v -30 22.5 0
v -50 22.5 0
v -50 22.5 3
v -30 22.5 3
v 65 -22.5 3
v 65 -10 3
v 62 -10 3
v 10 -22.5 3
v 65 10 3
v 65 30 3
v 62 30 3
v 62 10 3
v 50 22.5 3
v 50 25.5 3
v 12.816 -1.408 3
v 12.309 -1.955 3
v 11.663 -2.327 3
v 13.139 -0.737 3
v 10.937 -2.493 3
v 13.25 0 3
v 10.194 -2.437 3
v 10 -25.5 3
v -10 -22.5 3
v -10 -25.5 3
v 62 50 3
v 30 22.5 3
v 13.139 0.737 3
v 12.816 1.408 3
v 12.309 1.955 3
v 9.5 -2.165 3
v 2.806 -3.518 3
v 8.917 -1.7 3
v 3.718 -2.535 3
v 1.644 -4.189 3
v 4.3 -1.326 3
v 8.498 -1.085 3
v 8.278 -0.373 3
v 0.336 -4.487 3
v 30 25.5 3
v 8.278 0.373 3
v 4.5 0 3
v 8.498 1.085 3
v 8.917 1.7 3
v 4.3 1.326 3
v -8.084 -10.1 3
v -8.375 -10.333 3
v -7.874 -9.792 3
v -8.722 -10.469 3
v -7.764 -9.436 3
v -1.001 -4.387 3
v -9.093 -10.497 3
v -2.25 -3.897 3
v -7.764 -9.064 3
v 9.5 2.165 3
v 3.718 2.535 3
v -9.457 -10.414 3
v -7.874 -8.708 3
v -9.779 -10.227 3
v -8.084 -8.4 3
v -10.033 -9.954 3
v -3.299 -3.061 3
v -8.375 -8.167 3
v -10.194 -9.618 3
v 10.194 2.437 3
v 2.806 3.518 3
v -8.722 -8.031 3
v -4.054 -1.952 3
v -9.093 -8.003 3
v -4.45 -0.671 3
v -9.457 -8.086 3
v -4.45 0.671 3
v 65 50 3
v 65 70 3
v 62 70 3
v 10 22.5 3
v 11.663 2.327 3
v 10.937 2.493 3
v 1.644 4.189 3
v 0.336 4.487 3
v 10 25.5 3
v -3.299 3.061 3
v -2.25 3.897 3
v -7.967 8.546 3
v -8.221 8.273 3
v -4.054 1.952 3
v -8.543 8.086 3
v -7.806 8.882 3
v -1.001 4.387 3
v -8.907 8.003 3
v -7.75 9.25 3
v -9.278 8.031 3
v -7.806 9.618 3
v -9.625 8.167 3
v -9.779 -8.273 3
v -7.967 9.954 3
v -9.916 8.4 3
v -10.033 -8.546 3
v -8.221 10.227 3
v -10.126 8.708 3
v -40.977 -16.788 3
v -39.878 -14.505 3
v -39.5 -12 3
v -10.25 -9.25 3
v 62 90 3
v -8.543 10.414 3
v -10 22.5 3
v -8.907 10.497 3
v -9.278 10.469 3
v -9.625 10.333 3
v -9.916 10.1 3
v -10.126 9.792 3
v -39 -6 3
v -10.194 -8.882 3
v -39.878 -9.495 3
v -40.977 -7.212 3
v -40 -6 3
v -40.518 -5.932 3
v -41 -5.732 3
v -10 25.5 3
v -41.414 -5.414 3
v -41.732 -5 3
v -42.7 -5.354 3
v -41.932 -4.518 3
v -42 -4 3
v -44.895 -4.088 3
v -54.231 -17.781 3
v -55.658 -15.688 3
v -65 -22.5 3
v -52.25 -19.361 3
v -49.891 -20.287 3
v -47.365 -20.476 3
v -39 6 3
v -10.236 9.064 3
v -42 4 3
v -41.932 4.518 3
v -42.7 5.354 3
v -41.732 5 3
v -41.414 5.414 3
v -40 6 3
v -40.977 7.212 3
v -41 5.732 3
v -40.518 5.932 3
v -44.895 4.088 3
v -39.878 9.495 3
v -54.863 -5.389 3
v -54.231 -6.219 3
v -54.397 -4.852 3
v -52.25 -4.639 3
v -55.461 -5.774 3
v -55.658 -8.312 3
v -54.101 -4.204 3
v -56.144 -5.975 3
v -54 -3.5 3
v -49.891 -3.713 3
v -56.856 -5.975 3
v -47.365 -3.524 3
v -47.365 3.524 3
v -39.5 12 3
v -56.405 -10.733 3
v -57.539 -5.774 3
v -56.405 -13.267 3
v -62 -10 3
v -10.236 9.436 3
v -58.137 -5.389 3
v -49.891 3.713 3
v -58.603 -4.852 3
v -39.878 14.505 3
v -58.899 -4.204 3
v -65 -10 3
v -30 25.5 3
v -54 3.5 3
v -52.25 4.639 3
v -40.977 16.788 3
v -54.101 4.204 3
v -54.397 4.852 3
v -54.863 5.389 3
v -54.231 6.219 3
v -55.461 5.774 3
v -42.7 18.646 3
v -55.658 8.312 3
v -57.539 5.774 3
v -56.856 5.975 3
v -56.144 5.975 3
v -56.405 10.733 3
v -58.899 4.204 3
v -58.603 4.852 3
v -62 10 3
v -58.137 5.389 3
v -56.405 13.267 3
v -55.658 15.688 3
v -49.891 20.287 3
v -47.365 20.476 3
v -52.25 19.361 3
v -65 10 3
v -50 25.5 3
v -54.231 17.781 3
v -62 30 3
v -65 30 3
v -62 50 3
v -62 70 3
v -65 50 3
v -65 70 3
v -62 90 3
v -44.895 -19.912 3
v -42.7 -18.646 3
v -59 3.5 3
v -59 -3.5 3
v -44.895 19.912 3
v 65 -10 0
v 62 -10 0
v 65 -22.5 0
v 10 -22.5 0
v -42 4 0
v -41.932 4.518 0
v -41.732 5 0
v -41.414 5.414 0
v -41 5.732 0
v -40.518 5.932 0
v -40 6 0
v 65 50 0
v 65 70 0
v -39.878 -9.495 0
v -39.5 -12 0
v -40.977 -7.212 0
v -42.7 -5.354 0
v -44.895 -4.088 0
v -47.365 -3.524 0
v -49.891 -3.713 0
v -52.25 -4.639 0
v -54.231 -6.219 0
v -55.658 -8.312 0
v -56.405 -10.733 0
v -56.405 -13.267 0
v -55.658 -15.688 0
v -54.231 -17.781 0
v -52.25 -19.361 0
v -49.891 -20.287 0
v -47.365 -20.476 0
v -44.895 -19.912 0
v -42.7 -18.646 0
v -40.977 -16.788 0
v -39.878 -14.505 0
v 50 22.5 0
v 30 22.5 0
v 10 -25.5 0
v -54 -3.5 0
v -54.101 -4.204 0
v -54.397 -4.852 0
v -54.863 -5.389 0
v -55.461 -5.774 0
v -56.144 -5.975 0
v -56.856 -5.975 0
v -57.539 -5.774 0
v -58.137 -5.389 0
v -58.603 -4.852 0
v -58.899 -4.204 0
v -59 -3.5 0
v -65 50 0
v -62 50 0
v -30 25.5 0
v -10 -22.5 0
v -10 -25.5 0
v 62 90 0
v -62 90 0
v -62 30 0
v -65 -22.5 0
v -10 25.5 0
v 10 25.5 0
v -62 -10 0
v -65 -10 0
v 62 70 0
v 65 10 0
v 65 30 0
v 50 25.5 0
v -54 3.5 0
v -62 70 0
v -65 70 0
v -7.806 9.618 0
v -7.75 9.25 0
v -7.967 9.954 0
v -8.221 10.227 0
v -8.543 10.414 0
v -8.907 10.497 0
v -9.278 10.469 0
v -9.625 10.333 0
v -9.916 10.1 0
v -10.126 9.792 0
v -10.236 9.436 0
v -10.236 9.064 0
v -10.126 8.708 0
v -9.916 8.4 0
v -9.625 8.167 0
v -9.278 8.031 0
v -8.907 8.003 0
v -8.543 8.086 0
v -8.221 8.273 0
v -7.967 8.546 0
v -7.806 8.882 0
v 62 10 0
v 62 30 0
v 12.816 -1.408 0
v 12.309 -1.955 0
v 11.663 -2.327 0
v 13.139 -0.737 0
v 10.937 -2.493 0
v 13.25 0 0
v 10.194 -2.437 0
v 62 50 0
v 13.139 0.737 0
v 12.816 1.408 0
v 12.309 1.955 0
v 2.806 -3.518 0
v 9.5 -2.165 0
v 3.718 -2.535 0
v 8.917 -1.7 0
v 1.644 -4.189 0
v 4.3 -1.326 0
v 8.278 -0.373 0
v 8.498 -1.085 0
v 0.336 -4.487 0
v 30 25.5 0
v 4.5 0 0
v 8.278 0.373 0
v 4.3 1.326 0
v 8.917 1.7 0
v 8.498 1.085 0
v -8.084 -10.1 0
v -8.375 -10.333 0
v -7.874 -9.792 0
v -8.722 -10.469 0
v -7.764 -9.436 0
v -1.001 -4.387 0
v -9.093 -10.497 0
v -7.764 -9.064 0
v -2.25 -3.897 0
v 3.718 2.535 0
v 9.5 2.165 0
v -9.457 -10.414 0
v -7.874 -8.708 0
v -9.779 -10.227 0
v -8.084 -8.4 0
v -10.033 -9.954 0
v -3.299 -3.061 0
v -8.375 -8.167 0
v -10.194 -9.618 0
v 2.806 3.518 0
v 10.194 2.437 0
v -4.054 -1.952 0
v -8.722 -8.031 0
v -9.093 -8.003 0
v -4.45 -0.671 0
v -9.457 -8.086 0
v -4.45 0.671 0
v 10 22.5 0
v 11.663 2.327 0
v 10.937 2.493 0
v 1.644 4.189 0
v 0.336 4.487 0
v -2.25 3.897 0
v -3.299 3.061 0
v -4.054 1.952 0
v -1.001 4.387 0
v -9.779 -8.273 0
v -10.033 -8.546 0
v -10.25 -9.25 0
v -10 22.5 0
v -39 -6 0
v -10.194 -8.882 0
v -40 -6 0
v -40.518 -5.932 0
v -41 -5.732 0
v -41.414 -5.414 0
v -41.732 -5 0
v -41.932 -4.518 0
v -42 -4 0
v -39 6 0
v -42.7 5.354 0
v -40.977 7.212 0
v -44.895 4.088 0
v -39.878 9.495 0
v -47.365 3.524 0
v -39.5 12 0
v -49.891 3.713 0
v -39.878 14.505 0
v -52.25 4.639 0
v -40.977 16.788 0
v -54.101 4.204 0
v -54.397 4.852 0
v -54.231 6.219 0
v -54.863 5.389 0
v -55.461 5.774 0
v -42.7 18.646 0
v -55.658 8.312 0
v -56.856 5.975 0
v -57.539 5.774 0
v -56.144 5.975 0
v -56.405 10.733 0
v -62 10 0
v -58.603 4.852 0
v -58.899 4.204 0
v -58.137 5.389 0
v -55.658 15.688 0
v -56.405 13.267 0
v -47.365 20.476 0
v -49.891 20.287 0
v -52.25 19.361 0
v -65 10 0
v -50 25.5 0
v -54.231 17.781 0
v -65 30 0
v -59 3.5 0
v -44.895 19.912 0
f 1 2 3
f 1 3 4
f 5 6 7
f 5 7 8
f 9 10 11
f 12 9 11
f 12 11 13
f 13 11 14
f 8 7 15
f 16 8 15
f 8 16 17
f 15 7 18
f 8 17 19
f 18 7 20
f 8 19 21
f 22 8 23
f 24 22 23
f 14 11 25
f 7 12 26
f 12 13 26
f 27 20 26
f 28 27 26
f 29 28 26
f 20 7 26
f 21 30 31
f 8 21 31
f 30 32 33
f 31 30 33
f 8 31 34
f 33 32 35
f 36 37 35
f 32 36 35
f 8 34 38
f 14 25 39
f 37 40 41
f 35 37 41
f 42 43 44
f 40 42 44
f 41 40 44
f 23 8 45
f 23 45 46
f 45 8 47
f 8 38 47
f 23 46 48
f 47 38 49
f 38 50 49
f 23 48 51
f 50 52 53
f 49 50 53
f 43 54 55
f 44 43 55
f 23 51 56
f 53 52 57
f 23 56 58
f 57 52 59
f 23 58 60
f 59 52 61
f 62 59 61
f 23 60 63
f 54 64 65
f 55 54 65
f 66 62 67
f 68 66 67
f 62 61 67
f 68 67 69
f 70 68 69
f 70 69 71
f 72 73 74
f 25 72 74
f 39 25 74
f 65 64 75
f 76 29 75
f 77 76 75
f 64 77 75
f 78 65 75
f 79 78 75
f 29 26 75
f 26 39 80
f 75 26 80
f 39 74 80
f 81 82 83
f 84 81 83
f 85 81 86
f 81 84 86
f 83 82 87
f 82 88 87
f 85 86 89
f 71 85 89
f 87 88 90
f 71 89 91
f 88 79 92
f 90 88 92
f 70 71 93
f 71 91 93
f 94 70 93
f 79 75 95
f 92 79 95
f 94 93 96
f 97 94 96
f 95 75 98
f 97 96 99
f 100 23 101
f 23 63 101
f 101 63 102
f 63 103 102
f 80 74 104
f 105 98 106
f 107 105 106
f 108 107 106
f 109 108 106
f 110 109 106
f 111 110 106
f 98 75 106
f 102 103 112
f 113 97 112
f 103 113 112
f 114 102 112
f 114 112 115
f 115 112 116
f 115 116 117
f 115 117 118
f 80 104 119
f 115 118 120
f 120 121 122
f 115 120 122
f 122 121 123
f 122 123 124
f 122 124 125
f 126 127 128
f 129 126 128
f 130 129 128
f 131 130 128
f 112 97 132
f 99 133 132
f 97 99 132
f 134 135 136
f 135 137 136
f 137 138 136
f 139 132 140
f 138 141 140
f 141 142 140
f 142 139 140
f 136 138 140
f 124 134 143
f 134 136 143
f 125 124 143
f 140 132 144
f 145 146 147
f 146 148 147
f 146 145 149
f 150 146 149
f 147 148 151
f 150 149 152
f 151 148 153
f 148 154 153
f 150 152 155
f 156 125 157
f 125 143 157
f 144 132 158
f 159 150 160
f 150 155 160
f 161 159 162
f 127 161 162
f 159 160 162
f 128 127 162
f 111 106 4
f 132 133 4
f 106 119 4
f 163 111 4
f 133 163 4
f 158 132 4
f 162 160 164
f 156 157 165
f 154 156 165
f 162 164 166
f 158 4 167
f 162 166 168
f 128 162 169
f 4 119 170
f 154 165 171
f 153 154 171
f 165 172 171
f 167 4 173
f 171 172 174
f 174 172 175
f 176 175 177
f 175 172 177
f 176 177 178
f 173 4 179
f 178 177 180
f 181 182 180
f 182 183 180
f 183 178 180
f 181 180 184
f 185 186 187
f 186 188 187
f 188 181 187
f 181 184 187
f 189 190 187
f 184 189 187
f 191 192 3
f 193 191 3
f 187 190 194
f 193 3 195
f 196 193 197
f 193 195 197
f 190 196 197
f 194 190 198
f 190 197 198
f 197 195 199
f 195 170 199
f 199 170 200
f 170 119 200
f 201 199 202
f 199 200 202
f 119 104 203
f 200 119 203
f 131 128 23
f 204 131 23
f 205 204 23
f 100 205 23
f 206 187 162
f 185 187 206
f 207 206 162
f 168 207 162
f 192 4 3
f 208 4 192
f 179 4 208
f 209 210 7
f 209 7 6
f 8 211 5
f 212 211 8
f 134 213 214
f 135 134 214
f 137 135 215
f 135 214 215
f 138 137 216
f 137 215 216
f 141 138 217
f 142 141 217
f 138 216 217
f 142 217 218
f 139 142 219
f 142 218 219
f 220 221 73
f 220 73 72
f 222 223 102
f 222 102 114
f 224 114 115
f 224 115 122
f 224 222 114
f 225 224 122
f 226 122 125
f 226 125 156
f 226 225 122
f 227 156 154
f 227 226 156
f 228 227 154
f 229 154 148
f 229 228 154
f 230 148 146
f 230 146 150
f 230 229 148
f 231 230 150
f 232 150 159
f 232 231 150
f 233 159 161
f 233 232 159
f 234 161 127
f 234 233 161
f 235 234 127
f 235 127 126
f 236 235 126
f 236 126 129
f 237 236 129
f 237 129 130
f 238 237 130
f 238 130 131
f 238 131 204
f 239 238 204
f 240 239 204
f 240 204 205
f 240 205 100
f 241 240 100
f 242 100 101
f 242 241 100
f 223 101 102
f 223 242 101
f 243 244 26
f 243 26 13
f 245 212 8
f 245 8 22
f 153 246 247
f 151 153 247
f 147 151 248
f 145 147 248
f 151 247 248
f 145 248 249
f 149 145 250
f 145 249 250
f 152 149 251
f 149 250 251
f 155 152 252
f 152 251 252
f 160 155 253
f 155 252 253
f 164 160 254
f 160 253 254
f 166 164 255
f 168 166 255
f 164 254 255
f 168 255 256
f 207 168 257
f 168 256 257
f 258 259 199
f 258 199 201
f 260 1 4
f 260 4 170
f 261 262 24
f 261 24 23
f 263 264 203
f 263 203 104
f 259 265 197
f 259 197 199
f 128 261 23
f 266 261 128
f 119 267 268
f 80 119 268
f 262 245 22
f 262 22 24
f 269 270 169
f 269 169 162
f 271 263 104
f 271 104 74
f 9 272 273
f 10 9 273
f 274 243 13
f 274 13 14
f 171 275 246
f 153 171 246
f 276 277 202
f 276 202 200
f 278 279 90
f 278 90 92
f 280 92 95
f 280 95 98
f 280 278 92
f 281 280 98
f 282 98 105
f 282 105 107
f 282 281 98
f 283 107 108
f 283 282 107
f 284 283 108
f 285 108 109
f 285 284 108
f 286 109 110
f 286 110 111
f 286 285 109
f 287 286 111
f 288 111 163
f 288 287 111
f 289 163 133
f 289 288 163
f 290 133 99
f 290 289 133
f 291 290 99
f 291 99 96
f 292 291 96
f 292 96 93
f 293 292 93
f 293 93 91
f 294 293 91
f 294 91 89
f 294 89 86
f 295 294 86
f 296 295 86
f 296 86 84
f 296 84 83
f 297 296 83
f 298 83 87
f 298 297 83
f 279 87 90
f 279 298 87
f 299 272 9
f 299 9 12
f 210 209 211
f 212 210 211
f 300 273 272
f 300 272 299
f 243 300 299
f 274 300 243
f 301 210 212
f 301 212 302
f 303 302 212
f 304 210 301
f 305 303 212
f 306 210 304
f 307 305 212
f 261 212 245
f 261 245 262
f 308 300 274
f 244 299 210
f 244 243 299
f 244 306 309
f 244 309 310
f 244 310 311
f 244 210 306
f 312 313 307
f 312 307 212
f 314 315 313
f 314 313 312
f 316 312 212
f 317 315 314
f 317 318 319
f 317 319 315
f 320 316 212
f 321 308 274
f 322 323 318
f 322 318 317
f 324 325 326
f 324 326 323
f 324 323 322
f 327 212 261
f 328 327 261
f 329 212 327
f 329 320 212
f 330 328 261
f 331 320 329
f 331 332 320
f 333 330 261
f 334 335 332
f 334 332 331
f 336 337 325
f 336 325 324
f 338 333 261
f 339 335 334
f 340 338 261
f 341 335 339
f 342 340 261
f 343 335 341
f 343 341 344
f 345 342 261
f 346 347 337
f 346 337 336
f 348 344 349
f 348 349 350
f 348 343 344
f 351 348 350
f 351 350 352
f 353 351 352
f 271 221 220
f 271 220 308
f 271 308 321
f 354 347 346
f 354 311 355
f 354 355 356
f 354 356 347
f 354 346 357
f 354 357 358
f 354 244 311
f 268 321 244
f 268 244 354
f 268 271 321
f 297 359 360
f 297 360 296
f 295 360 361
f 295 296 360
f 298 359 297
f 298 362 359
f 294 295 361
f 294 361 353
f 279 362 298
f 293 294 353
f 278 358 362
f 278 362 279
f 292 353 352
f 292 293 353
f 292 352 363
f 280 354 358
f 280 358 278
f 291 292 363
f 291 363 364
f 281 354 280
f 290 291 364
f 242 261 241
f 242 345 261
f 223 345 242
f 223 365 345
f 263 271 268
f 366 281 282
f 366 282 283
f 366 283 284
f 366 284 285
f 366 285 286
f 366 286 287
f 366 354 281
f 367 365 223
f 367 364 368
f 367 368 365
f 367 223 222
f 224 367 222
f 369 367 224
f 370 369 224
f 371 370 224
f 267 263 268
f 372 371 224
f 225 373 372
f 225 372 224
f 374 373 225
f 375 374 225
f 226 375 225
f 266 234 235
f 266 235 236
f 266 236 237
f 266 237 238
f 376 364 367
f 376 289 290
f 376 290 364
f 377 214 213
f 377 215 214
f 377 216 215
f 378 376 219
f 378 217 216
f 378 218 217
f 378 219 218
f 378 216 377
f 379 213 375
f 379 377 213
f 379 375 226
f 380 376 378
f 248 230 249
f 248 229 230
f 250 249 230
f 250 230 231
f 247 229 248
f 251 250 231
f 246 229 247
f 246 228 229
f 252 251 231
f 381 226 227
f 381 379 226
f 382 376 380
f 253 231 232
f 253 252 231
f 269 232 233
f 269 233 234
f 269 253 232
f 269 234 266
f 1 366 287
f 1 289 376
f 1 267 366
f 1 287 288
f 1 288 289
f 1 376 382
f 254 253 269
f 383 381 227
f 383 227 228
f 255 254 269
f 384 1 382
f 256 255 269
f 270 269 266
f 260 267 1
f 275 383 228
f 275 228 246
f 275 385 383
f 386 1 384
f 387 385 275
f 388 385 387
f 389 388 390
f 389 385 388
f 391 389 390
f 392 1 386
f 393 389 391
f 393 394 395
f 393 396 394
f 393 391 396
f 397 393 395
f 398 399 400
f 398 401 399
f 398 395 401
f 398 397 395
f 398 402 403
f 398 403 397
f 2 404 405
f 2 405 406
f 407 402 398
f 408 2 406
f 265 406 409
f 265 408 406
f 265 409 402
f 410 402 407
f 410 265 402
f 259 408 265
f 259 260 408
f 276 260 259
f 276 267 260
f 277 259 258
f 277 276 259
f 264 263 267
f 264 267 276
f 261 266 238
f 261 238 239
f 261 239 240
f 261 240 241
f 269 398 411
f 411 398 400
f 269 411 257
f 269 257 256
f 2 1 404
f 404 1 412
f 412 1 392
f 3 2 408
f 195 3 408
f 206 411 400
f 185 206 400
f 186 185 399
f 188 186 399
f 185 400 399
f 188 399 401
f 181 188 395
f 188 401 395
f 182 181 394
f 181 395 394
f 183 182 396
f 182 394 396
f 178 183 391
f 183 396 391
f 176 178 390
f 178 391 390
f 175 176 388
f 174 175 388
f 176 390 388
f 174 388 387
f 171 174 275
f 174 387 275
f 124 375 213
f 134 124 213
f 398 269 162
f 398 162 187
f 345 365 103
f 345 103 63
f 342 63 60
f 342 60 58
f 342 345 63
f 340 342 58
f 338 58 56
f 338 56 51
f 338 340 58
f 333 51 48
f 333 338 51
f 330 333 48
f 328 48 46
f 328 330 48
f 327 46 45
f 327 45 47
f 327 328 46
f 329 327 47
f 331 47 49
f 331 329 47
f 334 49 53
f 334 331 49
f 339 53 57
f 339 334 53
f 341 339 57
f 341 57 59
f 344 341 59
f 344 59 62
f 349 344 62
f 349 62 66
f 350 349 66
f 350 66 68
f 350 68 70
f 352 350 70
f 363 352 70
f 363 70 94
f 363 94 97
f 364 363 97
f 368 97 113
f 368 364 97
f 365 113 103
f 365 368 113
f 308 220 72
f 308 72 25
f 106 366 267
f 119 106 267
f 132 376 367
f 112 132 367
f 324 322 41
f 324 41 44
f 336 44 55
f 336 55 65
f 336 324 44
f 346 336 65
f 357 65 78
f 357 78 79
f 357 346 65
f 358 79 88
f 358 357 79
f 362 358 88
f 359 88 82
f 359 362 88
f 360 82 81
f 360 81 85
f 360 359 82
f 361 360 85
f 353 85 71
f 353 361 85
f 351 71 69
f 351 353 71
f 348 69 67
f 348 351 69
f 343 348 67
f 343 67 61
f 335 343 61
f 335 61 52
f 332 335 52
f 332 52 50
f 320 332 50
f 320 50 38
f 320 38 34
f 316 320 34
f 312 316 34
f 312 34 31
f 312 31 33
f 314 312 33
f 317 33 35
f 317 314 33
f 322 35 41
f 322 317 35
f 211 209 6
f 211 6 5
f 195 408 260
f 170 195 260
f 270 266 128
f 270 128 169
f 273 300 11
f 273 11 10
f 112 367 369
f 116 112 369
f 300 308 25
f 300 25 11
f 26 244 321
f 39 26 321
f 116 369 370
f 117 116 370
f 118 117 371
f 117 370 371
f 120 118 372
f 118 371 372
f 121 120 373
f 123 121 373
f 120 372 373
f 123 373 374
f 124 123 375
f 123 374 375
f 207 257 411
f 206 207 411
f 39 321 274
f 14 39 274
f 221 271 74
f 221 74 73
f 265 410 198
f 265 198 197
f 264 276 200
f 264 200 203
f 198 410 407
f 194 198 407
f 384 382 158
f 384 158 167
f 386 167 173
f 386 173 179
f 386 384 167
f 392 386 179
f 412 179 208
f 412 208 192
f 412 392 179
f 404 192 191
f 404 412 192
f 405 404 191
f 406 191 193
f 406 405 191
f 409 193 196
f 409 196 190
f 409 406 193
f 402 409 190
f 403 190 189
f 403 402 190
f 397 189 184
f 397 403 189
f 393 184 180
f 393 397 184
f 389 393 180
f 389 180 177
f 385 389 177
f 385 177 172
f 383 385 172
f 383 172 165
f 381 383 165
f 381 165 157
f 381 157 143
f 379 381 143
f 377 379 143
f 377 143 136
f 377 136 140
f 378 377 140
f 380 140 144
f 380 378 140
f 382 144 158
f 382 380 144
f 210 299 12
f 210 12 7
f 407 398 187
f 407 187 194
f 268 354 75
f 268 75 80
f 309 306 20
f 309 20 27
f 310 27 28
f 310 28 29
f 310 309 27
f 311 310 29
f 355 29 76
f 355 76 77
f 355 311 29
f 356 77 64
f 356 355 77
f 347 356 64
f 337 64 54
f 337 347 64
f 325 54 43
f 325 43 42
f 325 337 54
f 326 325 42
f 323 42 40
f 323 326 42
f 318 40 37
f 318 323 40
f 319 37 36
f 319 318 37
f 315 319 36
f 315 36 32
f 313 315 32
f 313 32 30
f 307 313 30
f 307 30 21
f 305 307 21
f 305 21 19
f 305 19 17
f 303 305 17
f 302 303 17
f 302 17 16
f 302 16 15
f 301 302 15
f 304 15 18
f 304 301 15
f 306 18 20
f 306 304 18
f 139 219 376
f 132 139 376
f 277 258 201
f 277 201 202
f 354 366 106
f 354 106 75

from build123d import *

# Parameters (mm, degrees)
SKETCH1_R           = 8.5
SKETCH1_R_2         = 4.5
SKETCH1_R_3         = 2.5
SKETCH1_R_4         = 1.25
SKETCH1_W           = 20
SKETCH1_H           = 3
BOSS_EXTRUDE1_DEPTH = 3


with BuildPart() as part:
    # Sketch1 → Boss-Extrude1 (new body)
    with BuildSketch(Plane.XY):
        Polygon((-10, -22.5), (-65, -22.5), (-65, -10), (-62, -10), (-62, 10), (-65, 10), (-65, 22.5), (-65, 30), (-62, 30), (-62, 50), (-65, 50), (-65, 70), (-62, 70), (-62, 90), (62, 90), (62, 70), (65, 70), (65, 50), (62, 50), (62, 30), (65, 30), (65, 22.5), (65, 10), (62, 10), (62, -10), (65, -10), (65, -22.5), (10, -22.5), (10, -25.5), (-10, -25.5), align=None)
        with Locations((-48, 12)):
            Circle(SKETCH1_R, mode=Mode.SUBTRACT)
        with Locations((-48, -12)):
            Circle(SKETCH1_R, mode=Mode.SUBTRACT)
        Circle(SKETCH1_R_2, mode=Mode.SUBTRACT)
        with Locations((10.75, 0)):
            Circle(SKETCH1_R_3, mode=Mode.SUBTRACT)
        with Locations((-9, 9.25)):
            Circle(SKETCH1_R_4, mode=Mode.SUBTRACT)
        with Locations(Location((-9, -9.25, 0), (0, 0, 180))):
            Circle(SKETCH1_R_4, mode=Mode.SUBTRACT)
        with BuildLine():
            Line((-54, 3.5), (-54, -3.5))
            ThreePointArc((-54, -3.5), (-56.5, -6), (-59, -3.5))
            Line((-59, -3.5), (-59, 3.5))
            ThreePointArc((-59, 3.5), (-56.5, 6), (-54, 3.5))
        make_face(mode=Mode.SUBTRACT)
        with BuildLine():
            Line((-39, -6), (-40, -6))
            ThreePointArc((-40, -6), (-41.414213562, -5.414213562), (-42, -4))
            Line((-42, -4), (-42, 4))
            ThreePointArc((-42, 4), (-41.414213562, 5.414213562), (-40, 6))
            Line((-40, 6), (-39, 6))
            Line((-39, 6), (-39, -6))
        make_face(mode=Mode.SUBTRACT)
        with Locations((40, 24)):
            Rectangle(SKETCH1_W, SKETCH1_H, mode=Mode.SUBTRACT)
        with Locations((0, 24)):
            Rectangle(SKETCH1_W, SKETCH1_H, mode=Mode.SUBTRACT)
        with Locations((-40, 24)):
            Rectangle(SKETCH1_W, SKETCH1_H, mode=Mode.SUBTRACT)
    extrude(amount=BOSS_EXTRUDE1_DEPTH)


solid = part.part
